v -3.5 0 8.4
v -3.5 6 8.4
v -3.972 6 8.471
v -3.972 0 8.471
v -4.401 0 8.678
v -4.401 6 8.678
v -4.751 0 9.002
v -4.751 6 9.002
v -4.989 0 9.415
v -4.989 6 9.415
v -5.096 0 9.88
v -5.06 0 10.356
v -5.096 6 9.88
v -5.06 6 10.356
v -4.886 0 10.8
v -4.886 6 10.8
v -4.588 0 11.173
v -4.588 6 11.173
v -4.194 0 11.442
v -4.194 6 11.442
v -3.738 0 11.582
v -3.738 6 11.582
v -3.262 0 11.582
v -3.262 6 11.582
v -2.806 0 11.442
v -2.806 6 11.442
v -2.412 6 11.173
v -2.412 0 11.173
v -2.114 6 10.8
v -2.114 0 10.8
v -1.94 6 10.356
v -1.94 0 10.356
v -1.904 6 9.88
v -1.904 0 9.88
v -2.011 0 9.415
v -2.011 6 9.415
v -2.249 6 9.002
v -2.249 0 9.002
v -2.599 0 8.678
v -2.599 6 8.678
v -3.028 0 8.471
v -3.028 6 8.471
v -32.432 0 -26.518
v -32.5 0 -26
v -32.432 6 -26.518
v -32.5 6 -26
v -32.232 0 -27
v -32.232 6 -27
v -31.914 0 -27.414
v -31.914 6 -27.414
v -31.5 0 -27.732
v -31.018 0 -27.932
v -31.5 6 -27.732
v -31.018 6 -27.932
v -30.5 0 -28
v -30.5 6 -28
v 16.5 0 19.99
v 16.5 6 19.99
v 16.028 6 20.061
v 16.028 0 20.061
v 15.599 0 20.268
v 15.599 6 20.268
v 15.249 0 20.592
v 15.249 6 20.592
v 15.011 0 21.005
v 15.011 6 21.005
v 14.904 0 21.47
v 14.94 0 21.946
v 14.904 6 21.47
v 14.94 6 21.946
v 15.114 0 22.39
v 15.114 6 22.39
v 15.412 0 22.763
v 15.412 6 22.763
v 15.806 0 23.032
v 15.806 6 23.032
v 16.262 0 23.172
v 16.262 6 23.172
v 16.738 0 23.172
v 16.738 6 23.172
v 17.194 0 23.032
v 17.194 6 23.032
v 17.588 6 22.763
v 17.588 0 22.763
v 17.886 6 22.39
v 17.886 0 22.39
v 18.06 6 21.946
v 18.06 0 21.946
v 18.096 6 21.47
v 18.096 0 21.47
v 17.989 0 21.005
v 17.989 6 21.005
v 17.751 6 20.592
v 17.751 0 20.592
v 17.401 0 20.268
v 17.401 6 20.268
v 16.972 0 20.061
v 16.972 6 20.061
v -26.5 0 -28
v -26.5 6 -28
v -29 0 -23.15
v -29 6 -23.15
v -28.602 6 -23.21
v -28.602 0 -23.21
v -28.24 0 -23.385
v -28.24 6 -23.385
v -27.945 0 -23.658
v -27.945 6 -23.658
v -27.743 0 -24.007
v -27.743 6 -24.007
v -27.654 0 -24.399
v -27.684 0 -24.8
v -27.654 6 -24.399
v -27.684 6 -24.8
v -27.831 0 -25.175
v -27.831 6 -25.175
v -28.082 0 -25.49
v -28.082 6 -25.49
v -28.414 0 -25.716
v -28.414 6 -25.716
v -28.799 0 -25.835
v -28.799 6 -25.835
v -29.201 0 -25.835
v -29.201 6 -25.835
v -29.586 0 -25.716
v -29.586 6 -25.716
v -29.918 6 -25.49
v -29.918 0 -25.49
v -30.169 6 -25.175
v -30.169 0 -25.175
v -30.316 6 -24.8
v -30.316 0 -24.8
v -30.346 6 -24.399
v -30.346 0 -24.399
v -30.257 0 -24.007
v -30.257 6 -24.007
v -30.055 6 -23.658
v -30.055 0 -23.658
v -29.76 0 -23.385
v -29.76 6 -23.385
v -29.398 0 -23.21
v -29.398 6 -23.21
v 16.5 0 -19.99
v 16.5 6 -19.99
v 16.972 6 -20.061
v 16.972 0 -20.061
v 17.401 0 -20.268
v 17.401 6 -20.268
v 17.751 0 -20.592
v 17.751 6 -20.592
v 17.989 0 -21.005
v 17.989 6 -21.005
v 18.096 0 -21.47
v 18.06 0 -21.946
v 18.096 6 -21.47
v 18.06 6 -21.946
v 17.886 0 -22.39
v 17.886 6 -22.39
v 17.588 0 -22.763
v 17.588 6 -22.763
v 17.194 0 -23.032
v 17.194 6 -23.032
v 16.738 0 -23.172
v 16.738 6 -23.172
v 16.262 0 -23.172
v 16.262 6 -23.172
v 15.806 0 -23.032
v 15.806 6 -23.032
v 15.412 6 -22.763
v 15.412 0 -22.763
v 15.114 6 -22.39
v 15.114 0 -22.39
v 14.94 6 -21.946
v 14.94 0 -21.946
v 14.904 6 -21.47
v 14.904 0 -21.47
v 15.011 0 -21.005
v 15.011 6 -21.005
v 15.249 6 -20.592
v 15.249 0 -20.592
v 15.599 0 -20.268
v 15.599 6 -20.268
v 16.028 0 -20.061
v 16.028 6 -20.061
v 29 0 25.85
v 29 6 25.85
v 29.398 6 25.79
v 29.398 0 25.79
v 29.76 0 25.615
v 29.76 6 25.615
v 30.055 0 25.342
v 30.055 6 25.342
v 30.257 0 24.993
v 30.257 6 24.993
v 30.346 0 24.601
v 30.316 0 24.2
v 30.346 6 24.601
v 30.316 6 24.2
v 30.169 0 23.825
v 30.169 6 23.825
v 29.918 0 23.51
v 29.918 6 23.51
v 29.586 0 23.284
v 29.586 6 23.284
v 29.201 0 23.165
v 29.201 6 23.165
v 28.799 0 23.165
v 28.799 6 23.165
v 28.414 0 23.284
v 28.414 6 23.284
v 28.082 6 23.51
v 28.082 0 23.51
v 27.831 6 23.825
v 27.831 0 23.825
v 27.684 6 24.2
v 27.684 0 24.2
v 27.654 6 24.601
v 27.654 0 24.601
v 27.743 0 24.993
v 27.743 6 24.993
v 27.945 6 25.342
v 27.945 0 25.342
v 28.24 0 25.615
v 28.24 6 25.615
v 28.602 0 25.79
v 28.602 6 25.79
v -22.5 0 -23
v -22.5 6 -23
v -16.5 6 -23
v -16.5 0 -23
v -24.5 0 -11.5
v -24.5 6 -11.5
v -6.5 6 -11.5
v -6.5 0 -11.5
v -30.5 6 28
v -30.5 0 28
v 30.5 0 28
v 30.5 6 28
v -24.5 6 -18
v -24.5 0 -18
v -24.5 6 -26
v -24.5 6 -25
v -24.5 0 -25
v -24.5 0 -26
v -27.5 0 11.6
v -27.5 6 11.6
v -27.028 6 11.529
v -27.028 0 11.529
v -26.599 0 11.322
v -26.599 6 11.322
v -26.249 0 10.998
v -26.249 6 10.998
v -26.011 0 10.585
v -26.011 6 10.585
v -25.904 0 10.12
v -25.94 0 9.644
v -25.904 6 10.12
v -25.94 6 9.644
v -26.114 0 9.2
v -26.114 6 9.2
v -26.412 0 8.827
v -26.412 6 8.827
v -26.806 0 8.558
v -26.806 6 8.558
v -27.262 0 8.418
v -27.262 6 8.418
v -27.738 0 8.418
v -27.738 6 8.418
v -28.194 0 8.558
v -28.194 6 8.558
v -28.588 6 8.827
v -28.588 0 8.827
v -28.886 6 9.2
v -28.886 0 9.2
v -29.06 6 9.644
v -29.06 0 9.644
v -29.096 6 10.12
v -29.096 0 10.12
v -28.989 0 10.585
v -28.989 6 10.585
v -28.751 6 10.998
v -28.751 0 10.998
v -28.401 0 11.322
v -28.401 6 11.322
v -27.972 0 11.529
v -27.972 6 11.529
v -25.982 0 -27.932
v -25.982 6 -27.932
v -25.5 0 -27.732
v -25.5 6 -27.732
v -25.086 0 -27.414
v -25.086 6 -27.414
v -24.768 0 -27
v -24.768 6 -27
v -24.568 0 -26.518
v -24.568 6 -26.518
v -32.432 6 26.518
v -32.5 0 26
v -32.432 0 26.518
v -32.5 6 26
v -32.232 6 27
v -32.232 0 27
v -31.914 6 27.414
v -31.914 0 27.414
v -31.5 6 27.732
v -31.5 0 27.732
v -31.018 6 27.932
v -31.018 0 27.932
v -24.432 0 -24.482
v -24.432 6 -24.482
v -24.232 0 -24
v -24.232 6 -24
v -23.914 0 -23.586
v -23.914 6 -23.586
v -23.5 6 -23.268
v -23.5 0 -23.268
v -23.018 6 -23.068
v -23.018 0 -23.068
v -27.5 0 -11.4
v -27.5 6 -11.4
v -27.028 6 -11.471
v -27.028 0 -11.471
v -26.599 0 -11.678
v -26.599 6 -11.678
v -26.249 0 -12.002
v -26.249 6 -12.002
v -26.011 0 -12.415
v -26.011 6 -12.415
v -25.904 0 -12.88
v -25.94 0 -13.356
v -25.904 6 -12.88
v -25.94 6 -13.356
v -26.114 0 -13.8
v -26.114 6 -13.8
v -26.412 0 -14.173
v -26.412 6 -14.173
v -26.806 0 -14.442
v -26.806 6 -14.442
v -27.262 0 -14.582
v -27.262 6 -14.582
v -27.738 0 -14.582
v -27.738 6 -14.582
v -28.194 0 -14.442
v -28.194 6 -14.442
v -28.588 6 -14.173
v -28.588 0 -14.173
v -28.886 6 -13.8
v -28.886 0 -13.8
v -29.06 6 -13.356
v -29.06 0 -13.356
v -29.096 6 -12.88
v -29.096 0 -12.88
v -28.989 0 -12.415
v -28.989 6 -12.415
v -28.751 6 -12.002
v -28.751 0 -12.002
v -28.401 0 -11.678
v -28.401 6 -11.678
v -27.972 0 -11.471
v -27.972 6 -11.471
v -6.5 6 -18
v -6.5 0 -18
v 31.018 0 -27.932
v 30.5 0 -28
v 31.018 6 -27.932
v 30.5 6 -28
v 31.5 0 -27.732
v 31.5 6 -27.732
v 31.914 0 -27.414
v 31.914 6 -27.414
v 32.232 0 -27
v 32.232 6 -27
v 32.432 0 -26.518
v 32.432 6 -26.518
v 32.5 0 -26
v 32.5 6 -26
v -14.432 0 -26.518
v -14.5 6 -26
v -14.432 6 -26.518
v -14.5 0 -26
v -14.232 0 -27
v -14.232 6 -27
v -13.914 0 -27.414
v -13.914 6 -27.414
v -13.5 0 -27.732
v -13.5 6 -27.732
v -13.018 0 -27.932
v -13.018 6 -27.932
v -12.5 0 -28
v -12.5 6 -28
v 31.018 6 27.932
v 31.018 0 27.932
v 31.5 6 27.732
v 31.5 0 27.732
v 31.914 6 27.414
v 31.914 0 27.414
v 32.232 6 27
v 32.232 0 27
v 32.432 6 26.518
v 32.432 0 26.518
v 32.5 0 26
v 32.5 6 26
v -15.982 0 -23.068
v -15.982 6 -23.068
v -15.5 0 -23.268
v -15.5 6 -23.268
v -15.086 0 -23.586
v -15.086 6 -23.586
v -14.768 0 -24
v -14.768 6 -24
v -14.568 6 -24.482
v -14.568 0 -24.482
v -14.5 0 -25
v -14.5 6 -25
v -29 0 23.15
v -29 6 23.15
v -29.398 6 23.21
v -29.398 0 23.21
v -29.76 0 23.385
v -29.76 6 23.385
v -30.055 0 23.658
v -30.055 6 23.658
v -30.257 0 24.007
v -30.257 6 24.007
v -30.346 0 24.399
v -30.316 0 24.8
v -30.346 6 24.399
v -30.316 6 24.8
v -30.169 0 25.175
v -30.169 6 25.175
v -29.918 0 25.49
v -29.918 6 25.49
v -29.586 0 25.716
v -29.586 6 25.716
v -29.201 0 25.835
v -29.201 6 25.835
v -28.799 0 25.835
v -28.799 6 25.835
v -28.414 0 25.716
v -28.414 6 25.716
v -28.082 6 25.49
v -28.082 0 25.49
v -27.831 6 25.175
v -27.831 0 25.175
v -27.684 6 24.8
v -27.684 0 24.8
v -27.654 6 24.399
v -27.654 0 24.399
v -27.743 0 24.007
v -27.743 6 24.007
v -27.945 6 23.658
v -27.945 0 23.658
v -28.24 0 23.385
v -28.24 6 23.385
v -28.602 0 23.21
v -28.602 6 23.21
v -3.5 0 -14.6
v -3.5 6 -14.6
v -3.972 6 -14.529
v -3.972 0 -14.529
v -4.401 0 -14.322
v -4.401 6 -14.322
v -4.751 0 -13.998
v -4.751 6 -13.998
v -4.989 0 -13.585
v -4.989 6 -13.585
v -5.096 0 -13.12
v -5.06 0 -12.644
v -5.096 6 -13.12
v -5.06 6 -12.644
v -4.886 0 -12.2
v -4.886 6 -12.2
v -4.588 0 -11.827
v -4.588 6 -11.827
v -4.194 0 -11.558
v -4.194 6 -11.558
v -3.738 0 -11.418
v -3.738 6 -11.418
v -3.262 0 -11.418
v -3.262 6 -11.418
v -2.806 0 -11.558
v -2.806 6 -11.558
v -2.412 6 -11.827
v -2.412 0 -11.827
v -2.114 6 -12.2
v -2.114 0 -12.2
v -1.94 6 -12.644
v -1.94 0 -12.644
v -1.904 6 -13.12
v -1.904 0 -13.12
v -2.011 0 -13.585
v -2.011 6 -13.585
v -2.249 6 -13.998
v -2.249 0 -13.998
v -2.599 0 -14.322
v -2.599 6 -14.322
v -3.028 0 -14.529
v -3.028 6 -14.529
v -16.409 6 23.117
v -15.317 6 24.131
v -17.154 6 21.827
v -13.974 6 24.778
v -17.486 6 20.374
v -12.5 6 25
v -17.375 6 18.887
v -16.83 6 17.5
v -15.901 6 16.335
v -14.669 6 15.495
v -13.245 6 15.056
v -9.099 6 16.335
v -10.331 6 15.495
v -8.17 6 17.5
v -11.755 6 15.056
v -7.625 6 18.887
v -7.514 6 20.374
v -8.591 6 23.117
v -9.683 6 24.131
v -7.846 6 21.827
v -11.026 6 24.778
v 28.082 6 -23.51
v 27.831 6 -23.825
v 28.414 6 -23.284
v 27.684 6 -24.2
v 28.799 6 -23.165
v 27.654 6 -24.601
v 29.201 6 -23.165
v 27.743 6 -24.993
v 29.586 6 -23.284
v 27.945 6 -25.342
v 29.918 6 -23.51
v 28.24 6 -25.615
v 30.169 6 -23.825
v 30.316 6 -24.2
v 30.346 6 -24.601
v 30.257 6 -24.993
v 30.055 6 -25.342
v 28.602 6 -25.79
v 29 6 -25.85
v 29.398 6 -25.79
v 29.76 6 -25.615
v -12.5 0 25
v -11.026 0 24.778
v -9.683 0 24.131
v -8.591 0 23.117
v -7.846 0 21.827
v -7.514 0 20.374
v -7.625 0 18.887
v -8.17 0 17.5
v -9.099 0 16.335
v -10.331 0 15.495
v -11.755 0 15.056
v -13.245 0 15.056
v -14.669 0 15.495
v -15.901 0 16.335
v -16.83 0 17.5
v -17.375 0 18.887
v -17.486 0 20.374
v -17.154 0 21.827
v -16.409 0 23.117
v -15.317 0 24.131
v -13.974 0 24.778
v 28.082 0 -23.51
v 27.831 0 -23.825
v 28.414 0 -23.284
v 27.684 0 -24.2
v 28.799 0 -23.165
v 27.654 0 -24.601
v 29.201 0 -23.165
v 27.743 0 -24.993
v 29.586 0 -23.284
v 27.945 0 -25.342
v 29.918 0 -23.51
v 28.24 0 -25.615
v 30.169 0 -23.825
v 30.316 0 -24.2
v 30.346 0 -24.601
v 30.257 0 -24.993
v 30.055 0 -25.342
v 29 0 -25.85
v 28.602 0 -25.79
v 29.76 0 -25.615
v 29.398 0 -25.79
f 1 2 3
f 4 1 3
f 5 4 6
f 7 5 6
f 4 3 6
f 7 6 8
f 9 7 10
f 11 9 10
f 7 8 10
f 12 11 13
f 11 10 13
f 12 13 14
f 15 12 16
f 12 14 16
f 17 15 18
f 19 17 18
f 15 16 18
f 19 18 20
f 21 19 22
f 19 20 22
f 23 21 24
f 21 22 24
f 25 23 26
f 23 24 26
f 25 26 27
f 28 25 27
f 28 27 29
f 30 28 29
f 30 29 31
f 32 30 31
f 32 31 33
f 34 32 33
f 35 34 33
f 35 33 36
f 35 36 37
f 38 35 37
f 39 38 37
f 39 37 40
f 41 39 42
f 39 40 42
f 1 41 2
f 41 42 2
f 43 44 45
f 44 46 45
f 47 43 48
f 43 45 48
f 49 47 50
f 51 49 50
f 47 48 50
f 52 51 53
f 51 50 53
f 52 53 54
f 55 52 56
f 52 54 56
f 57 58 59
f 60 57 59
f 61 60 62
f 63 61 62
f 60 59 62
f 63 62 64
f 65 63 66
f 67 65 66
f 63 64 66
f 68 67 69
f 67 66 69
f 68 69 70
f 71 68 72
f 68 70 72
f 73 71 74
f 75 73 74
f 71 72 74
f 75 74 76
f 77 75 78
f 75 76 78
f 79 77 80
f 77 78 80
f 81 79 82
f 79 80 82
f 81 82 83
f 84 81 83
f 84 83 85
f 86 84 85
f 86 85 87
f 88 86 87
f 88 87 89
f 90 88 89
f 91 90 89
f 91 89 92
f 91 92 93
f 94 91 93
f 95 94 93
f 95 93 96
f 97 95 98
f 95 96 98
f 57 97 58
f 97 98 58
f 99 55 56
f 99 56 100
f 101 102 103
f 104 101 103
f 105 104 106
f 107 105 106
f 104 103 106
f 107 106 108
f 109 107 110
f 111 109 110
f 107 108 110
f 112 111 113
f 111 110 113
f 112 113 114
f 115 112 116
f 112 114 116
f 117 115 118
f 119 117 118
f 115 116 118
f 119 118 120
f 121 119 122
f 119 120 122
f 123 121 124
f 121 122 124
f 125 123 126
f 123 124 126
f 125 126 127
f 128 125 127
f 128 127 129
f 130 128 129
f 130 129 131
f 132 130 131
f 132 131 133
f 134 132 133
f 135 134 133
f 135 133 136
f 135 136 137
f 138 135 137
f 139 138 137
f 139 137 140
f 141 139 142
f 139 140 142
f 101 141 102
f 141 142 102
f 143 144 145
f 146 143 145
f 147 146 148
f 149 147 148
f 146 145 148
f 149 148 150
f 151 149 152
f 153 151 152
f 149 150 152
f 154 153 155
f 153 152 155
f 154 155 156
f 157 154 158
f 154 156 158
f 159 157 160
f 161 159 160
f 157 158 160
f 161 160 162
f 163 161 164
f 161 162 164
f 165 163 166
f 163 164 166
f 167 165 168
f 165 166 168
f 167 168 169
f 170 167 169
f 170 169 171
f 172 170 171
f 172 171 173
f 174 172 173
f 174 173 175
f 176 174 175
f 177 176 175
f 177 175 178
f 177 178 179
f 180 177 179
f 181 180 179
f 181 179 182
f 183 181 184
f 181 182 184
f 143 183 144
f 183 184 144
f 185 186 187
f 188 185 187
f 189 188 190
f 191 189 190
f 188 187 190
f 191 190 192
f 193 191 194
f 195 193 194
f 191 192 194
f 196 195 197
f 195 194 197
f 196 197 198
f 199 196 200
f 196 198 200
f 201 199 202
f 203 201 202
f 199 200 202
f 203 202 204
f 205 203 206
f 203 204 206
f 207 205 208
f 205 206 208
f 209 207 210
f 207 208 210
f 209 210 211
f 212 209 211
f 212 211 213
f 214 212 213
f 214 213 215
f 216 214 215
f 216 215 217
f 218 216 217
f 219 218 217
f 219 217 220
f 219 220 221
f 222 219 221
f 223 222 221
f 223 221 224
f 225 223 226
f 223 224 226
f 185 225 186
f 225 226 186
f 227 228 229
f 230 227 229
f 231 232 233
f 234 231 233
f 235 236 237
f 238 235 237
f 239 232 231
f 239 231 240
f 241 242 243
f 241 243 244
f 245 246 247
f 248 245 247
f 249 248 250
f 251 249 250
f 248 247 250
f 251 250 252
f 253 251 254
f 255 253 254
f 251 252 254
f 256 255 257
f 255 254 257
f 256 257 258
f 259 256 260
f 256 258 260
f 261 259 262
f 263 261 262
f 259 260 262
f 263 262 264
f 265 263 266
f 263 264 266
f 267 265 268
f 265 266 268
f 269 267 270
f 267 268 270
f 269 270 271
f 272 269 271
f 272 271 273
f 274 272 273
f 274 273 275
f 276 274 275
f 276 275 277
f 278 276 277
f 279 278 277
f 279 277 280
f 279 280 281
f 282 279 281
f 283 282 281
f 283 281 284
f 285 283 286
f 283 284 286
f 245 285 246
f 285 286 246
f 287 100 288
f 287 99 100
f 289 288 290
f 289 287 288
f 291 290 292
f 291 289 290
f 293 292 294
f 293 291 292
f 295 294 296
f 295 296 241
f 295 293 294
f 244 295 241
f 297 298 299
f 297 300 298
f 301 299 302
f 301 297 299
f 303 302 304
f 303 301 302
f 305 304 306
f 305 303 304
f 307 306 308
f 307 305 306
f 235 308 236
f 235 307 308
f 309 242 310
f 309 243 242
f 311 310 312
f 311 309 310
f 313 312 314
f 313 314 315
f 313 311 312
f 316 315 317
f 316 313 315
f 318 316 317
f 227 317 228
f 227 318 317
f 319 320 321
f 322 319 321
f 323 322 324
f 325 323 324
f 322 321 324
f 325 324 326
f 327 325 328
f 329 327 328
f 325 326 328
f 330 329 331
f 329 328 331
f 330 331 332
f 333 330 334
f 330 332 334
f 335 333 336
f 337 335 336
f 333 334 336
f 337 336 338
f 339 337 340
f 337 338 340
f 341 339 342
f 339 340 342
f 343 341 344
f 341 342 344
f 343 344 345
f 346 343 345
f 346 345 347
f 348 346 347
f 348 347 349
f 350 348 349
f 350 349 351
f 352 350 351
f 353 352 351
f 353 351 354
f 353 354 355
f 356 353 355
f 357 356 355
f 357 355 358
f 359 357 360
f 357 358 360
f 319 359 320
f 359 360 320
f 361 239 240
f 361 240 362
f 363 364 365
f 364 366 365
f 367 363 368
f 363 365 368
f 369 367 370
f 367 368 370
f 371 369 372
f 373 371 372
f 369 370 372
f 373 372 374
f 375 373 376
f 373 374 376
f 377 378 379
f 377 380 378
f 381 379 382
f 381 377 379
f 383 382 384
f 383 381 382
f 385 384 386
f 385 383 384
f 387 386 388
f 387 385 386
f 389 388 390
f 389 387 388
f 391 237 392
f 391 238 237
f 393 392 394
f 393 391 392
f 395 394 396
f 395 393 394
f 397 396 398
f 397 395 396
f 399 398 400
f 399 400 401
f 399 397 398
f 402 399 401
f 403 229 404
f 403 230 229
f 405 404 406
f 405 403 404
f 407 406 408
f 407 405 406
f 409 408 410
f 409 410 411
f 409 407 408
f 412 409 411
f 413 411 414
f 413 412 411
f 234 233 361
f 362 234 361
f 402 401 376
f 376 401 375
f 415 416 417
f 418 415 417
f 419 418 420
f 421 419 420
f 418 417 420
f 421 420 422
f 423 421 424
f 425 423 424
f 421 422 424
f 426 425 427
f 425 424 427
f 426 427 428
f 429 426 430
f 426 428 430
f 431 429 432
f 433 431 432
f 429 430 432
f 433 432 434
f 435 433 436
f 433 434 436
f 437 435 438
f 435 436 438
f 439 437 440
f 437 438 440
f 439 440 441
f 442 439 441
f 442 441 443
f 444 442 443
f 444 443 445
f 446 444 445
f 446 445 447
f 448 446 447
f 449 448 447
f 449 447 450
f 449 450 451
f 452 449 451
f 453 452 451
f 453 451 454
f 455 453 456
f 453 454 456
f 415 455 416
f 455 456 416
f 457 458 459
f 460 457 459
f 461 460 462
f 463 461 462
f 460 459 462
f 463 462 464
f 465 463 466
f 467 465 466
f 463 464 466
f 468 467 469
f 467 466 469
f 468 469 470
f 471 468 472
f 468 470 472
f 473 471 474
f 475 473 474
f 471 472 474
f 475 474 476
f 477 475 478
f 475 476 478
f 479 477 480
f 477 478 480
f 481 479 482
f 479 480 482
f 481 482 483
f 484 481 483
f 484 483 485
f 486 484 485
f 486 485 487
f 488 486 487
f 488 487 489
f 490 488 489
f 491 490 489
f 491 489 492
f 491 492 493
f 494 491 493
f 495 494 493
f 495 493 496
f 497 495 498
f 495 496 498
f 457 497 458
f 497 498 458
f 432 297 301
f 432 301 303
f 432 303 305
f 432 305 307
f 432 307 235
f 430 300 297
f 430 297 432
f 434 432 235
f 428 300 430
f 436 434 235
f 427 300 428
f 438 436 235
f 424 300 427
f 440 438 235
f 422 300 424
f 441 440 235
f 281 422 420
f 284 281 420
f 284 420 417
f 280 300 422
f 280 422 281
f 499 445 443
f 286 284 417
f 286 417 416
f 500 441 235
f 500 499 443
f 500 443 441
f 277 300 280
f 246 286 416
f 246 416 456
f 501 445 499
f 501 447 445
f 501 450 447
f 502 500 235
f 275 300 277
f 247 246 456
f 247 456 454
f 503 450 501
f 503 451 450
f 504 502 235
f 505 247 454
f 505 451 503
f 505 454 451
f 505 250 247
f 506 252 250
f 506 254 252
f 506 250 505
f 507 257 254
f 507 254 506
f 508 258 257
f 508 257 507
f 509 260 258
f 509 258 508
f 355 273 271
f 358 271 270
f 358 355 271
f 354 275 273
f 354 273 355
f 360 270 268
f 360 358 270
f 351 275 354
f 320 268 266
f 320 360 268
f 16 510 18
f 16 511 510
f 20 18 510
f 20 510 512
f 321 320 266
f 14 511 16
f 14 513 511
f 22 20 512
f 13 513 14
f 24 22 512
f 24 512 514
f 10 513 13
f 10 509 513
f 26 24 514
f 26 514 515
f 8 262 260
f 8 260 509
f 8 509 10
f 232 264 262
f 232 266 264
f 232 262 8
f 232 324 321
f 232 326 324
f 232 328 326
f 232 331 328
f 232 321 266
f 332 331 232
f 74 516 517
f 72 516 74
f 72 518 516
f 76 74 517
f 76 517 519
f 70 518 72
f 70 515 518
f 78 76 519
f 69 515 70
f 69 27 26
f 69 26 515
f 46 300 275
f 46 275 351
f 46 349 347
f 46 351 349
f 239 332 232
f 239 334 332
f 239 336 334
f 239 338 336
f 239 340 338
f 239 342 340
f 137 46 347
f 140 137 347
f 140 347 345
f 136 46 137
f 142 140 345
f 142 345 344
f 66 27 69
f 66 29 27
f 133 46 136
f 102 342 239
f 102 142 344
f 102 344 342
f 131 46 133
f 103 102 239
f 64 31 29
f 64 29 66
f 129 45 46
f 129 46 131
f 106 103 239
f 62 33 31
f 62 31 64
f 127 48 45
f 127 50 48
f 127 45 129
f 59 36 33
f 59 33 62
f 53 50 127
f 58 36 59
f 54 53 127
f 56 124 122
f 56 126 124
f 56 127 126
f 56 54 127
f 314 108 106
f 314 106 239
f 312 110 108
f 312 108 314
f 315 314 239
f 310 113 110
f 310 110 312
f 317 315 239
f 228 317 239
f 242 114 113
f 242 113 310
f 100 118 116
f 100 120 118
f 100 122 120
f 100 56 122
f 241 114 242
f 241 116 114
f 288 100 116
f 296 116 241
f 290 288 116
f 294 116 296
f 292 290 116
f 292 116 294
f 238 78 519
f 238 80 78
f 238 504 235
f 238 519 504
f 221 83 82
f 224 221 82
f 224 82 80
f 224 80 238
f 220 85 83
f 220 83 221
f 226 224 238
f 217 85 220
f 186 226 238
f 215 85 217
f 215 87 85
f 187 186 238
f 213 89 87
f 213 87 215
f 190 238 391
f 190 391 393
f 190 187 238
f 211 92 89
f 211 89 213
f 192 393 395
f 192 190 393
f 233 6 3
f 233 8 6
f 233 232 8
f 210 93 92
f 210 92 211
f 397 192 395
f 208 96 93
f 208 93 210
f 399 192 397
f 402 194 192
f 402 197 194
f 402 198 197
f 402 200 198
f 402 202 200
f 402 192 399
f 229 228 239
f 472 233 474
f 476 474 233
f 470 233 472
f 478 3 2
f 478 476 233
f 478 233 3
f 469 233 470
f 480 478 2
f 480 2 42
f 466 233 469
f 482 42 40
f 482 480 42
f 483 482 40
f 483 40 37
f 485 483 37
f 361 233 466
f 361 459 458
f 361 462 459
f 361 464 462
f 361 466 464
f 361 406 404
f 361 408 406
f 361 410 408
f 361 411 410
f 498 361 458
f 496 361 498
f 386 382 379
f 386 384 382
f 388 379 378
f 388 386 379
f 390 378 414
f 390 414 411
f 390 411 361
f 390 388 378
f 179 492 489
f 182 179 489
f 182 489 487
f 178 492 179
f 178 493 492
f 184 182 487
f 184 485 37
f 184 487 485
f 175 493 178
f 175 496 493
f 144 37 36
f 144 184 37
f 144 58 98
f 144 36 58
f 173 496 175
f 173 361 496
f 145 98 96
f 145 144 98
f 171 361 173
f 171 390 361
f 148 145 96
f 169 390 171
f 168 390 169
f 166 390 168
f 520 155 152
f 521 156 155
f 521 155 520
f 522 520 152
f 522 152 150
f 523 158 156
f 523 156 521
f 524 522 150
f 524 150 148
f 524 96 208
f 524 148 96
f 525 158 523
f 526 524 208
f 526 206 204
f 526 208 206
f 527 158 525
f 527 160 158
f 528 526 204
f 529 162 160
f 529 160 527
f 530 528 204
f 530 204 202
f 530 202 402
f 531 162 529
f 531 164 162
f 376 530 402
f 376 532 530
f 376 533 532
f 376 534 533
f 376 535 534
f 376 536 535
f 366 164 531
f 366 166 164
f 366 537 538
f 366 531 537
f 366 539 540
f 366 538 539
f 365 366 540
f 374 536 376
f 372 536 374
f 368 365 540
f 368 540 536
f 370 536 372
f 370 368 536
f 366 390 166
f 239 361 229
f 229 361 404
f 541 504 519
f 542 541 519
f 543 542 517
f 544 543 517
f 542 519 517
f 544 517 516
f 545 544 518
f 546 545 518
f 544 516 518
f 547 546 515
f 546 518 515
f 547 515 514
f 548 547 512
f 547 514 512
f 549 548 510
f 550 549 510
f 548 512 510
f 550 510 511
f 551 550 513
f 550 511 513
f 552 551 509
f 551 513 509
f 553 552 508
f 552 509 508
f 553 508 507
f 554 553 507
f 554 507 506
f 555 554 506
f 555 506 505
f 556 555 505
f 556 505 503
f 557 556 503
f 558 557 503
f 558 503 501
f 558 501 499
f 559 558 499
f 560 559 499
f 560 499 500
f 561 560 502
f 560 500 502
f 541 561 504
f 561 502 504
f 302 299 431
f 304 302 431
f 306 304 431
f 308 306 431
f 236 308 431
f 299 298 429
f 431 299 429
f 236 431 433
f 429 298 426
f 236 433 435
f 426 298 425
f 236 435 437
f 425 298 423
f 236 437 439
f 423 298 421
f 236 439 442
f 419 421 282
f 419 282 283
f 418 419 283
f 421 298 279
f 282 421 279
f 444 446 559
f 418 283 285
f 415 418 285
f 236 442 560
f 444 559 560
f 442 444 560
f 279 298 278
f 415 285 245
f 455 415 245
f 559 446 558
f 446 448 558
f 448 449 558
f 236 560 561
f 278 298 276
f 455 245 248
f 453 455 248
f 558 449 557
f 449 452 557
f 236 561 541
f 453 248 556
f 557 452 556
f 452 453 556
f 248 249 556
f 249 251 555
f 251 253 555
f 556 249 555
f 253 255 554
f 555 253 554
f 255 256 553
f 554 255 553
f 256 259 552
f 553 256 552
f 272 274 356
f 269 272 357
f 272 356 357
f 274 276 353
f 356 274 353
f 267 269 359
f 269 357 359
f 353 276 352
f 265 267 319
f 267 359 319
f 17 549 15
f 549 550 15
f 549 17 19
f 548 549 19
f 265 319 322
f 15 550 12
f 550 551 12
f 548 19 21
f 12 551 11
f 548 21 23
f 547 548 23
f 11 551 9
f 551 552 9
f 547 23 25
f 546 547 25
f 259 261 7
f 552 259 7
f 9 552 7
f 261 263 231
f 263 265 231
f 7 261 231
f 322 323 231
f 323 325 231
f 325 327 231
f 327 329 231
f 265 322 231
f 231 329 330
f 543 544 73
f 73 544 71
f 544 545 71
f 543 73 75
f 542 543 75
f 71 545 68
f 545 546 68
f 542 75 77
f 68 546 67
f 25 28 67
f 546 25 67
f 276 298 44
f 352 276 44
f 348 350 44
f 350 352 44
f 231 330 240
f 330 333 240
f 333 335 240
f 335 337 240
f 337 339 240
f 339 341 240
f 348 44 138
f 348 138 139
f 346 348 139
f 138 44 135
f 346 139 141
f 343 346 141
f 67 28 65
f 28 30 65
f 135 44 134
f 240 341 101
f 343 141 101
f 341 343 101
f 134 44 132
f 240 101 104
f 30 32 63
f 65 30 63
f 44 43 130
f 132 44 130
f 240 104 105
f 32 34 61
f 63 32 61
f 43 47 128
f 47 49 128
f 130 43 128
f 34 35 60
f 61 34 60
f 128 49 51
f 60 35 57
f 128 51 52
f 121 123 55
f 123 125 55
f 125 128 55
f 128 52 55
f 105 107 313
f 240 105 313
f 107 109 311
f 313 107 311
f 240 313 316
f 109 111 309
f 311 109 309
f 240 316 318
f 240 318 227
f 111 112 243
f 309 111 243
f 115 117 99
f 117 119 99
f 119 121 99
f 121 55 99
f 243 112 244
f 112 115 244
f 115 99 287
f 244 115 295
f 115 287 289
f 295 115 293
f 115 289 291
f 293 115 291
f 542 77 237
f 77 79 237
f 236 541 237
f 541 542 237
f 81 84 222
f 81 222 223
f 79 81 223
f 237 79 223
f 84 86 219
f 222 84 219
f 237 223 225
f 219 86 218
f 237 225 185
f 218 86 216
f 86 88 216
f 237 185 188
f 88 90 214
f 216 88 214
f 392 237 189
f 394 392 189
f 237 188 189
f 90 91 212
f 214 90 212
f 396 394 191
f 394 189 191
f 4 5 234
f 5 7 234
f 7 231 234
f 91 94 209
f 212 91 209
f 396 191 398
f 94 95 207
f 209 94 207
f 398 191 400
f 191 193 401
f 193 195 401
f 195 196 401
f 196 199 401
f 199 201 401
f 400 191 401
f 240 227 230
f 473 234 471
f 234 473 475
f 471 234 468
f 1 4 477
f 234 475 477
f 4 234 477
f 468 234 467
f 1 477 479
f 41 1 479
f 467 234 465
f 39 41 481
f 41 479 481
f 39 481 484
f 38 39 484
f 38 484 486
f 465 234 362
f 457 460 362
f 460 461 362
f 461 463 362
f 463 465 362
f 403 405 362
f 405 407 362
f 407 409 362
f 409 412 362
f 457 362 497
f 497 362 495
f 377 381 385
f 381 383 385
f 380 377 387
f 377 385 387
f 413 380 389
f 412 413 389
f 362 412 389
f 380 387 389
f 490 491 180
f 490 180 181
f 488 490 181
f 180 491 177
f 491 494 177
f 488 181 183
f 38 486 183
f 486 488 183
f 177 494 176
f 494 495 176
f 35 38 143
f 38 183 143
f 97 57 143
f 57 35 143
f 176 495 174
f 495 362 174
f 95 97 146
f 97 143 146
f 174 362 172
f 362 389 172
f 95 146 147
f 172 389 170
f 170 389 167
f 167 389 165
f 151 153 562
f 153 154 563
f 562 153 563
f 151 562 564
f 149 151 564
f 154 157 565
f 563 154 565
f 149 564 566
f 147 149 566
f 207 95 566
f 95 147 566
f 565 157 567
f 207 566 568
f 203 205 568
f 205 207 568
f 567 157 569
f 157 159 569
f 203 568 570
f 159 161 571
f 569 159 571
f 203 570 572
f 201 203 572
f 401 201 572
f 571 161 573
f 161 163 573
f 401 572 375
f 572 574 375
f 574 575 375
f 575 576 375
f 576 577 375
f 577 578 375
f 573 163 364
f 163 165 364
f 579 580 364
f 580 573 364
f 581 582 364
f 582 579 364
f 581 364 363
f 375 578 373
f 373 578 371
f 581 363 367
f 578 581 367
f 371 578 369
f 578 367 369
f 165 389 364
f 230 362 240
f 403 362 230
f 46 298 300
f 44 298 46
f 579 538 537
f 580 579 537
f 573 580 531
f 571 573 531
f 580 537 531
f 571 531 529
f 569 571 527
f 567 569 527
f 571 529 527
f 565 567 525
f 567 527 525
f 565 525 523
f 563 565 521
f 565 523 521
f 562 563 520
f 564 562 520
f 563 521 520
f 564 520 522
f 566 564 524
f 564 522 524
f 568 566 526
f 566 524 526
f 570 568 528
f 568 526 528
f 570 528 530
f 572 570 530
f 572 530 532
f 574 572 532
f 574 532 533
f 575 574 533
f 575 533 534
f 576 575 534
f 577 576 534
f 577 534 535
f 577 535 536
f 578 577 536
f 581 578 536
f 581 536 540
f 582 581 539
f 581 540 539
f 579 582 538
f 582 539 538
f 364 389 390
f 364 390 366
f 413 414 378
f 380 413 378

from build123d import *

# Parameters (mm, degrees)
SKETCH_1_W          = 65
SKETCH_1_H          = 56
EXTRUDE_1_DEPTH     = 6
SKETCH_2_R          = 1.35
CUT_EXTRUDE_1_DEPTH = 6
FILLET_2_R          = 2
SKETCH_5_R          = 1.6
CUT_EXTRUDE_3_DEPTH = 6
SKETCH_7_R          = 1.6
CUT_EXTRUDE_4_DEPTH = 6
SKETCH_8_R          = 5
CUT_EXTRUDE_5_DEPTH = 6
SKETCH_9_W          = 18
SKETCH_9_H          = 6.5
CUT_EXTRUDE_6_DEPTH = 6
SKETCH_10_W         = 10
SKETCH_10_H         = 5
CUT_EXTRUDE_7_DEPTH = 6
FILLET_3_R          = 2


with BuildPart() as part:
    # 草图1 → 凸台-拉伸1 (new body)
    with BuildSketch(Plane(origin=(0, 0, 0), x_dir=(1, 0, 0), z_dir=(0, 1, 0))):
        Rectangle(SKETCH_1_W, SKETCH_1_H)
    extrude(amount=EXTRUDE_1_DEPTH)

    # 草图2 → 切除-拉伸1 (cut)
    with BuildSketch(Plane(origin=(0, 6, 0), x_dir=(1, 0, 0), z_dir=(0, 1, 0))):
        with Locations(Location((-29, 24.5, 0), (0, 0, 270))):
            Circle(SKETCH_2_R)
        with Locations(Location((29, 24.5, 0), (0, 0, 90))):
            Circle(SKETCH_2_R)
        with Locations(Location((29, -24.5, 0), (0, 0, 270))):
            Circle(SKETCH_2_R)
        with Locations(Location((-29, -24.5, 0), (0, 0, 90))):
            Circle(SKETCH_2_R)
    extrude(amount=-CUT_EXTRUDE_1_DEPTH, mode=Mode.SUBTRACT)

    # 圆角2
    fillet_2_edges = [part.edges().sort_by_distance(p)[0] for p in [
        (32.5, 3, 28),
        (-32.5, 3, 28),
        (-32.5, 3, -28),
        (32.5, 3, -28),
    ]]
    fillet(fillet_2_edges, radius=FILLET_2_R)

    # 草图5 → 切除-拉伸3 (cut)
    with BuildSketch(Plane(origin=(0, 6, 0), x_dir=(1, 0, 0), z_dir=(0, 1, 0))):
        with Locations(Location((-27.5, 13, 0), (0, 0, 270))):
            Circle(SKETCH_5_R)
        with Locations(Location((-3.5, 13, 0), (0, 0, 90))):
            Circle(SKETCH_5_R)
        with Locations(Location((-27.5, -10, 0), (0, 0, 270))):
            Circle(SKETCH_5_R)
        with Locations(Location((-3.5, -10, 0), (0, 0, 90))):
            Circle(SKETCH_5_R)
    extrude(amount=-CUT_EXTRUDE_3_DEPTH, mode=Mode.SUBTRACT)

    # 草图7 → 切除-拉伸4 (cut)
    with BuildSketch(Plane(origin=(0, 6, 0), x_dir=(1, 0, 0), z_dir=(0, 1, 0))):
        with Locations(Location((16.5, 21.59, 0), (0, 0, 270))):
            Circle(SKETCH_7_R)
        with Locations(Location((16.5, -21.59, 0), (0, 0, 90))):
            Circle(SKETCH_7_R)
    extrude(amount=-CUT_EXTRUDE_4_DEPTH, mode=Mode.SUBTRACT)

    # 草图8 → 切除-拉伸5 (cut)
    with BuildSketch(Plane(origin=(0, 6, 0), x_dir=(1, 0, 0), z_dir=(0, 1, 0))):
        with Locations(Location((-12.5, -20, 0), (0, 0, 270))):
            Circle(SKETCH_8_R)
    extrude(amount=-CUT_EXTRUDE_5_DEPTH, mode=Mode.SUBTRACT)

    # 草图9 → 切除-拉伸6 (cut)
    with BuildSketch(Plane(origin=(0, 6, 0), x_dir=(1, 0, 0), z_dir=(0, 1, 0))):
        with Locations((-15.5, 14.75)):
            Rectangle(SKETCH_9_W, SKETCH_9_H)
    extrude(amount=-CUT_EXTRUDE_6_DEPTH, mode=Mode.SUBTRACT)

    # 草图10 → 切除-拉伸7 (cut)
    with BuildSketch(Plane(origin=(0, 6, 0), x_dir=(1, 0, 0), z_dir=(0, 1, 0))):
        with Locations((-19.5, 25.5)):
            Rectangle(SKETCH_10_W, SKETCH_10_H)
    extrude(amount=-CUT_EXTRUDE_7_DEPTH, mode=Mode.SUBTRACT)

    # 圆角3
    fillet_3_edges = [part.edges().sort_by_distance(p)[0] for p in [
        (-14.5, 3, -23),
        (-14.5, 3, -28),
        (-24.5, 3, -28),
        (-24.5, 3, -23),
    ]]
    fillet(fillet_3_edges, radius=FILLET_3_R)


solid = part.part
